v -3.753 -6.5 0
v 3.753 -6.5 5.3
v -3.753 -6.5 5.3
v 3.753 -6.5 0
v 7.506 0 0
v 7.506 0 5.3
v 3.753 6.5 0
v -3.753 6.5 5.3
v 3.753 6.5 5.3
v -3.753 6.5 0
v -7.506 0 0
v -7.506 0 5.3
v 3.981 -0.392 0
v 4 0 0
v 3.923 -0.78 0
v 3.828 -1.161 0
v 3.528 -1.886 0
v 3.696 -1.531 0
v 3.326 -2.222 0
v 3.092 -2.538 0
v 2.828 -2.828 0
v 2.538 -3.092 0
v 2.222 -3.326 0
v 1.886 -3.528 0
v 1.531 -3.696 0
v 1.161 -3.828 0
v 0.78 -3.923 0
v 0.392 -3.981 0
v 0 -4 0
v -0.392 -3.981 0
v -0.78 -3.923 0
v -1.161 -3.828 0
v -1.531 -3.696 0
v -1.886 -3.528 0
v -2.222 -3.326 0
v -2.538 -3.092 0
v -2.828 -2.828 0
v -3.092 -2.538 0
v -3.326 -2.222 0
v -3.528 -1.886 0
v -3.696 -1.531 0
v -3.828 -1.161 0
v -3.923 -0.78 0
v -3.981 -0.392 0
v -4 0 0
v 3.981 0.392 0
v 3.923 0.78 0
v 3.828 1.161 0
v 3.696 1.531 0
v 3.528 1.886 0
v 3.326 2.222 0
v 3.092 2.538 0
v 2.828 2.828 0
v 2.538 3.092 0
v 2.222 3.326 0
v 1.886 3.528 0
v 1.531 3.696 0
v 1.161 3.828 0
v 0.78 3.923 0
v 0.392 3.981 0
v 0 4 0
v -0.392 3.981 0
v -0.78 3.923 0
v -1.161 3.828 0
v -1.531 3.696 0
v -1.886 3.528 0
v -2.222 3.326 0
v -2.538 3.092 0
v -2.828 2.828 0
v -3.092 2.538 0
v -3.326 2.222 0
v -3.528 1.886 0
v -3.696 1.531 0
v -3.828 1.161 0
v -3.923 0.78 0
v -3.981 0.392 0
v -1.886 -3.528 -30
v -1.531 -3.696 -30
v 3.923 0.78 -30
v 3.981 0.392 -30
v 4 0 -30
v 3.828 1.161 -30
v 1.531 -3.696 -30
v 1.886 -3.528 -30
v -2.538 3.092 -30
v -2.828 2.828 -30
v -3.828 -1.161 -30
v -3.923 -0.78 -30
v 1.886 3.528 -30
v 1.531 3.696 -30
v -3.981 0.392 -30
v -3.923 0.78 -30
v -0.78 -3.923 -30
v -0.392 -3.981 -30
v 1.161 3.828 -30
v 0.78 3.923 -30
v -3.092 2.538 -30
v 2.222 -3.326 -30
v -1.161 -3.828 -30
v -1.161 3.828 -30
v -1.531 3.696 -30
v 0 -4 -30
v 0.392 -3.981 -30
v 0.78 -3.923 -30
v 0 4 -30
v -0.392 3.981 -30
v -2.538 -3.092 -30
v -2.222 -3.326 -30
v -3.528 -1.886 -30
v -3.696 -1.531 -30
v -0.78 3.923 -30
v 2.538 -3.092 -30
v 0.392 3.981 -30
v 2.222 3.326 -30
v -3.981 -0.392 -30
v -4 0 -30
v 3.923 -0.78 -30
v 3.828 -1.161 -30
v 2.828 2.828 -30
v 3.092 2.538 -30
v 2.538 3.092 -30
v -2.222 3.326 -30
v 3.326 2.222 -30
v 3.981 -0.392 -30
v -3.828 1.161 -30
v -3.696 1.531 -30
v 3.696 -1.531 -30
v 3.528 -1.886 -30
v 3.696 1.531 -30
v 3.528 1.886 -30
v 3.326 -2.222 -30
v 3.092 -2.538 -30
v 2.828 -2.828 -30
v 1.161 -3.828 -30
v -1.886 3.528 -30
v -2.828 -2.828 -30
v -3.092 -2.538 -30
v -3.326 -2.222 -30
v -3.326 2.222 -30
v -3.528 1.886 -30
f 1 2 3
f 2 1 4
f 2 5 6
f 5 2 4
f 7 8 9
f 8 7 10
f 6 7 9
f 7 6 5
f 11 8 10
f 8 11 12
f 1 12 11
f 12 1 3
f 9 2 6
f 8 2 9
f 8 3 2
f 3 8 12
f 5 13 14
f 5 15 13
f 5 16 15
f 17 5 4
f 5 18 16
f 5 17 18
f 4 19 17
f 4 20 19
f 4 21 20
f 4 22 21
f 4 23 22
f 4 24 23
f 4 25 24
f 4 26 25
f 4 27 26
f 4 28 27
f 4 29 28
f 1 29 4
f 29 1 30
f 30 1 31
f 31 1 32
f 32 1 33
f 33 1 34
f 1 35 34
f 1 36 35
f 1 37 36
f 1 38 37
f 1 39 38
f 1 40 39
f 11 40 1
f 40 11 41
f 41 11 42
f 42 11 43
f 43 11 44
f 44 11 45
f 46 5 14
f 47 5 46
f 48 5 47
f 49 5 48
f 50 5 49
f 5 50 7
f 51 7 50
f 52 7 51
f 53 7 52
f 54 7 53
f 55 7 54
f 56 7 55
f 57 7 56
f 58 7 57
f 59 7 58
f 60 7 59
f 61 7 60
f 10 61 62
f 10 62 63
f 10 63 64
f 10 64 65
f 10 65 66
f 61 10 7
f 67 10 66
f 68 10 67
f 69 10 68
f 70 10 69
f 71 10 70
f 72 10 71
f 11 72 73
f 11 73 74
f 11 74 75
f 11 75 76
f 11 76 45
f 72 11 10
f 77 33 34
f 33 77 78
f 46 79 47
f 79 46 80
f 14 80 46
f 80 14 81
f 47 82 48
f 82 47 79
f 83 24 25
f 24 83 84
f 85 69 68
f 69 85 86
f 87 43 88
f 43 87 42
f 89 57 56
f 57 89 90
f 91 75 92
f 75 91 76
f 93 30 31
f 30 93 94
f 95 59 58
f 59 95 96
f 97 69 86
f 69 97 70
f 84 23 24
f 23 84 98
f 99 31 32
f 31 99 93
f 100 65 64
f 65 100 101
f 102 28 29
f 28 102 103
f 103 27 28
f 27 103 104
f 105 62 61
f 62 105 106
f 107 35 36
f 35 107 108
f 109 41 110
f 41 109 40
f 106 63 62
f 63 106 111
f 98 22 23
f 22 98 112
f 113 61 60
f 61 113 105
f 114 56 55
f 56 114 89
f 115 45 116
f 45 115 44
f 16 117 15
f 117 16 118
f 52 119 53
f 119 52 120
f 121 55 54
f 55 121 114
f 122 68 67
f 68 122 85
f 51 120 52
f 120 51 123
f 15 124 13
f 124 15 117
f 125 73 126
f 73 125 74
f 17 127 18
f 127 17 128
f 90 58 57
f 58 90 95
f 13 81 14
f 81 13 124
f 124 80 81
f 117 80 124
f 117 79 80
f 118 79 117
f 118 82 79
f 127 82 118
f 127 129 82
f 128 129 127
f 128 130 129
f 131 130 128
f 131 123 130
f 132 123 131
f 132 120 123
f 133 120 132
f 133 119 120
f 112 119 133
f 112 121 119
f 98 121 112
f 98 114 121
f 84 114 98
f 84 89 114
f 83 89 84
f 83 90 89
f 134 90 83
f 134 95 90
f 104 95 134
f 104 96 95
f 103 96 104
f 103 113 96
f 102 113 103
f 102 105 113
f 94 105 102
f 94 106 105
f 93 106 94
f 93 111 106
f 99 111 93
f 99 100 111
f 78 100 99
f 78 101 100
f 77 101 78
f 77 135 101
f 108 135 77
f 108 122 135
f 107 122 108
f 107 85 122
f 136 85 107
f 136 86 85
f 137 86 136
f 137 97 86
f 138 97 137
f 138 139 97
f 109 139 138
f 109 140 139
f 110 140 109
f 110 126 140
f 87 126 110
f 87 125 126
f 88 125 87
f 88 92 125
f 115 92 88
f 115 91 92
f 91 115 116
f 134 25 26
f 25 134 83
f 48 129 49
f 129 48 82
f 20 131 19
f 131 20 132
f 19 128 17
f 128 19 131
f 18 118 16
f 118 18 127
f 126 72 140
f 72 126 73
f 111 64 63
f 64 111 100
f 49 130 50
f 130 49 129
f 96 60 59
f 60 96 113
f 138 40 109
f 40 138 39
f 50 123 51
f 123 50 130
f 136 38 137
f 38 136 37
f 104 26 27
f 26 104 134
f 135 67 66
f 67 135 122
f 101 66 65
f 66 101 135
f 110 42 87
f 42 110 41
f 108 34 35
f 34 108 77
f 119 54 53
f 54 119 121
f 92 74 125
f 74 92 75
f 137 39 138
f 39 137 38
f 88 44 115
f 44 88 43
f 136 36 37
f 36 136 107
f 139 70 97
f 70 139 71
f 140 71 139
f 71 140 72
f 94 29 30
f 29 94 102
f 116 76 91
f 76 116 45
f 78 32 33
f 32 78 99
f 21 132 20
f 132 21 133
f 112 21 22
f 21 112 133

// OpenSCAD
// M8 六角ボルト(ねじ山省略・円柱シャンク)

af      = 13;    // 頭部 対辺距離 (across-flats) [mm]
head_h  = 5.3;   // 頭部高さ [mm]
shank_d = 8;     // シャンク直径 [mm]
shank_l = 30;    // シャンク長さ [mm]

$fn = 64;        // 円柱の滑らかさ

module hex_bolt_m8() {
    // 頭部: 六角柱(底面が z=0、上方向 +Z へ)
    // $fn=6 の cylinder は外接円基準なので、対辺距離から外接円直径に換算
    cylinder(d = af / cos(30), h = head_h, $fn = 6);

    // シャンク: z = -shank_l から z = 0 まで(-Z 側へ伸ばす)
    translate([0, 0, -shank_l])
        cylinder(d = shank_d, h = shank_l);
}

hex_bolt_m8();
